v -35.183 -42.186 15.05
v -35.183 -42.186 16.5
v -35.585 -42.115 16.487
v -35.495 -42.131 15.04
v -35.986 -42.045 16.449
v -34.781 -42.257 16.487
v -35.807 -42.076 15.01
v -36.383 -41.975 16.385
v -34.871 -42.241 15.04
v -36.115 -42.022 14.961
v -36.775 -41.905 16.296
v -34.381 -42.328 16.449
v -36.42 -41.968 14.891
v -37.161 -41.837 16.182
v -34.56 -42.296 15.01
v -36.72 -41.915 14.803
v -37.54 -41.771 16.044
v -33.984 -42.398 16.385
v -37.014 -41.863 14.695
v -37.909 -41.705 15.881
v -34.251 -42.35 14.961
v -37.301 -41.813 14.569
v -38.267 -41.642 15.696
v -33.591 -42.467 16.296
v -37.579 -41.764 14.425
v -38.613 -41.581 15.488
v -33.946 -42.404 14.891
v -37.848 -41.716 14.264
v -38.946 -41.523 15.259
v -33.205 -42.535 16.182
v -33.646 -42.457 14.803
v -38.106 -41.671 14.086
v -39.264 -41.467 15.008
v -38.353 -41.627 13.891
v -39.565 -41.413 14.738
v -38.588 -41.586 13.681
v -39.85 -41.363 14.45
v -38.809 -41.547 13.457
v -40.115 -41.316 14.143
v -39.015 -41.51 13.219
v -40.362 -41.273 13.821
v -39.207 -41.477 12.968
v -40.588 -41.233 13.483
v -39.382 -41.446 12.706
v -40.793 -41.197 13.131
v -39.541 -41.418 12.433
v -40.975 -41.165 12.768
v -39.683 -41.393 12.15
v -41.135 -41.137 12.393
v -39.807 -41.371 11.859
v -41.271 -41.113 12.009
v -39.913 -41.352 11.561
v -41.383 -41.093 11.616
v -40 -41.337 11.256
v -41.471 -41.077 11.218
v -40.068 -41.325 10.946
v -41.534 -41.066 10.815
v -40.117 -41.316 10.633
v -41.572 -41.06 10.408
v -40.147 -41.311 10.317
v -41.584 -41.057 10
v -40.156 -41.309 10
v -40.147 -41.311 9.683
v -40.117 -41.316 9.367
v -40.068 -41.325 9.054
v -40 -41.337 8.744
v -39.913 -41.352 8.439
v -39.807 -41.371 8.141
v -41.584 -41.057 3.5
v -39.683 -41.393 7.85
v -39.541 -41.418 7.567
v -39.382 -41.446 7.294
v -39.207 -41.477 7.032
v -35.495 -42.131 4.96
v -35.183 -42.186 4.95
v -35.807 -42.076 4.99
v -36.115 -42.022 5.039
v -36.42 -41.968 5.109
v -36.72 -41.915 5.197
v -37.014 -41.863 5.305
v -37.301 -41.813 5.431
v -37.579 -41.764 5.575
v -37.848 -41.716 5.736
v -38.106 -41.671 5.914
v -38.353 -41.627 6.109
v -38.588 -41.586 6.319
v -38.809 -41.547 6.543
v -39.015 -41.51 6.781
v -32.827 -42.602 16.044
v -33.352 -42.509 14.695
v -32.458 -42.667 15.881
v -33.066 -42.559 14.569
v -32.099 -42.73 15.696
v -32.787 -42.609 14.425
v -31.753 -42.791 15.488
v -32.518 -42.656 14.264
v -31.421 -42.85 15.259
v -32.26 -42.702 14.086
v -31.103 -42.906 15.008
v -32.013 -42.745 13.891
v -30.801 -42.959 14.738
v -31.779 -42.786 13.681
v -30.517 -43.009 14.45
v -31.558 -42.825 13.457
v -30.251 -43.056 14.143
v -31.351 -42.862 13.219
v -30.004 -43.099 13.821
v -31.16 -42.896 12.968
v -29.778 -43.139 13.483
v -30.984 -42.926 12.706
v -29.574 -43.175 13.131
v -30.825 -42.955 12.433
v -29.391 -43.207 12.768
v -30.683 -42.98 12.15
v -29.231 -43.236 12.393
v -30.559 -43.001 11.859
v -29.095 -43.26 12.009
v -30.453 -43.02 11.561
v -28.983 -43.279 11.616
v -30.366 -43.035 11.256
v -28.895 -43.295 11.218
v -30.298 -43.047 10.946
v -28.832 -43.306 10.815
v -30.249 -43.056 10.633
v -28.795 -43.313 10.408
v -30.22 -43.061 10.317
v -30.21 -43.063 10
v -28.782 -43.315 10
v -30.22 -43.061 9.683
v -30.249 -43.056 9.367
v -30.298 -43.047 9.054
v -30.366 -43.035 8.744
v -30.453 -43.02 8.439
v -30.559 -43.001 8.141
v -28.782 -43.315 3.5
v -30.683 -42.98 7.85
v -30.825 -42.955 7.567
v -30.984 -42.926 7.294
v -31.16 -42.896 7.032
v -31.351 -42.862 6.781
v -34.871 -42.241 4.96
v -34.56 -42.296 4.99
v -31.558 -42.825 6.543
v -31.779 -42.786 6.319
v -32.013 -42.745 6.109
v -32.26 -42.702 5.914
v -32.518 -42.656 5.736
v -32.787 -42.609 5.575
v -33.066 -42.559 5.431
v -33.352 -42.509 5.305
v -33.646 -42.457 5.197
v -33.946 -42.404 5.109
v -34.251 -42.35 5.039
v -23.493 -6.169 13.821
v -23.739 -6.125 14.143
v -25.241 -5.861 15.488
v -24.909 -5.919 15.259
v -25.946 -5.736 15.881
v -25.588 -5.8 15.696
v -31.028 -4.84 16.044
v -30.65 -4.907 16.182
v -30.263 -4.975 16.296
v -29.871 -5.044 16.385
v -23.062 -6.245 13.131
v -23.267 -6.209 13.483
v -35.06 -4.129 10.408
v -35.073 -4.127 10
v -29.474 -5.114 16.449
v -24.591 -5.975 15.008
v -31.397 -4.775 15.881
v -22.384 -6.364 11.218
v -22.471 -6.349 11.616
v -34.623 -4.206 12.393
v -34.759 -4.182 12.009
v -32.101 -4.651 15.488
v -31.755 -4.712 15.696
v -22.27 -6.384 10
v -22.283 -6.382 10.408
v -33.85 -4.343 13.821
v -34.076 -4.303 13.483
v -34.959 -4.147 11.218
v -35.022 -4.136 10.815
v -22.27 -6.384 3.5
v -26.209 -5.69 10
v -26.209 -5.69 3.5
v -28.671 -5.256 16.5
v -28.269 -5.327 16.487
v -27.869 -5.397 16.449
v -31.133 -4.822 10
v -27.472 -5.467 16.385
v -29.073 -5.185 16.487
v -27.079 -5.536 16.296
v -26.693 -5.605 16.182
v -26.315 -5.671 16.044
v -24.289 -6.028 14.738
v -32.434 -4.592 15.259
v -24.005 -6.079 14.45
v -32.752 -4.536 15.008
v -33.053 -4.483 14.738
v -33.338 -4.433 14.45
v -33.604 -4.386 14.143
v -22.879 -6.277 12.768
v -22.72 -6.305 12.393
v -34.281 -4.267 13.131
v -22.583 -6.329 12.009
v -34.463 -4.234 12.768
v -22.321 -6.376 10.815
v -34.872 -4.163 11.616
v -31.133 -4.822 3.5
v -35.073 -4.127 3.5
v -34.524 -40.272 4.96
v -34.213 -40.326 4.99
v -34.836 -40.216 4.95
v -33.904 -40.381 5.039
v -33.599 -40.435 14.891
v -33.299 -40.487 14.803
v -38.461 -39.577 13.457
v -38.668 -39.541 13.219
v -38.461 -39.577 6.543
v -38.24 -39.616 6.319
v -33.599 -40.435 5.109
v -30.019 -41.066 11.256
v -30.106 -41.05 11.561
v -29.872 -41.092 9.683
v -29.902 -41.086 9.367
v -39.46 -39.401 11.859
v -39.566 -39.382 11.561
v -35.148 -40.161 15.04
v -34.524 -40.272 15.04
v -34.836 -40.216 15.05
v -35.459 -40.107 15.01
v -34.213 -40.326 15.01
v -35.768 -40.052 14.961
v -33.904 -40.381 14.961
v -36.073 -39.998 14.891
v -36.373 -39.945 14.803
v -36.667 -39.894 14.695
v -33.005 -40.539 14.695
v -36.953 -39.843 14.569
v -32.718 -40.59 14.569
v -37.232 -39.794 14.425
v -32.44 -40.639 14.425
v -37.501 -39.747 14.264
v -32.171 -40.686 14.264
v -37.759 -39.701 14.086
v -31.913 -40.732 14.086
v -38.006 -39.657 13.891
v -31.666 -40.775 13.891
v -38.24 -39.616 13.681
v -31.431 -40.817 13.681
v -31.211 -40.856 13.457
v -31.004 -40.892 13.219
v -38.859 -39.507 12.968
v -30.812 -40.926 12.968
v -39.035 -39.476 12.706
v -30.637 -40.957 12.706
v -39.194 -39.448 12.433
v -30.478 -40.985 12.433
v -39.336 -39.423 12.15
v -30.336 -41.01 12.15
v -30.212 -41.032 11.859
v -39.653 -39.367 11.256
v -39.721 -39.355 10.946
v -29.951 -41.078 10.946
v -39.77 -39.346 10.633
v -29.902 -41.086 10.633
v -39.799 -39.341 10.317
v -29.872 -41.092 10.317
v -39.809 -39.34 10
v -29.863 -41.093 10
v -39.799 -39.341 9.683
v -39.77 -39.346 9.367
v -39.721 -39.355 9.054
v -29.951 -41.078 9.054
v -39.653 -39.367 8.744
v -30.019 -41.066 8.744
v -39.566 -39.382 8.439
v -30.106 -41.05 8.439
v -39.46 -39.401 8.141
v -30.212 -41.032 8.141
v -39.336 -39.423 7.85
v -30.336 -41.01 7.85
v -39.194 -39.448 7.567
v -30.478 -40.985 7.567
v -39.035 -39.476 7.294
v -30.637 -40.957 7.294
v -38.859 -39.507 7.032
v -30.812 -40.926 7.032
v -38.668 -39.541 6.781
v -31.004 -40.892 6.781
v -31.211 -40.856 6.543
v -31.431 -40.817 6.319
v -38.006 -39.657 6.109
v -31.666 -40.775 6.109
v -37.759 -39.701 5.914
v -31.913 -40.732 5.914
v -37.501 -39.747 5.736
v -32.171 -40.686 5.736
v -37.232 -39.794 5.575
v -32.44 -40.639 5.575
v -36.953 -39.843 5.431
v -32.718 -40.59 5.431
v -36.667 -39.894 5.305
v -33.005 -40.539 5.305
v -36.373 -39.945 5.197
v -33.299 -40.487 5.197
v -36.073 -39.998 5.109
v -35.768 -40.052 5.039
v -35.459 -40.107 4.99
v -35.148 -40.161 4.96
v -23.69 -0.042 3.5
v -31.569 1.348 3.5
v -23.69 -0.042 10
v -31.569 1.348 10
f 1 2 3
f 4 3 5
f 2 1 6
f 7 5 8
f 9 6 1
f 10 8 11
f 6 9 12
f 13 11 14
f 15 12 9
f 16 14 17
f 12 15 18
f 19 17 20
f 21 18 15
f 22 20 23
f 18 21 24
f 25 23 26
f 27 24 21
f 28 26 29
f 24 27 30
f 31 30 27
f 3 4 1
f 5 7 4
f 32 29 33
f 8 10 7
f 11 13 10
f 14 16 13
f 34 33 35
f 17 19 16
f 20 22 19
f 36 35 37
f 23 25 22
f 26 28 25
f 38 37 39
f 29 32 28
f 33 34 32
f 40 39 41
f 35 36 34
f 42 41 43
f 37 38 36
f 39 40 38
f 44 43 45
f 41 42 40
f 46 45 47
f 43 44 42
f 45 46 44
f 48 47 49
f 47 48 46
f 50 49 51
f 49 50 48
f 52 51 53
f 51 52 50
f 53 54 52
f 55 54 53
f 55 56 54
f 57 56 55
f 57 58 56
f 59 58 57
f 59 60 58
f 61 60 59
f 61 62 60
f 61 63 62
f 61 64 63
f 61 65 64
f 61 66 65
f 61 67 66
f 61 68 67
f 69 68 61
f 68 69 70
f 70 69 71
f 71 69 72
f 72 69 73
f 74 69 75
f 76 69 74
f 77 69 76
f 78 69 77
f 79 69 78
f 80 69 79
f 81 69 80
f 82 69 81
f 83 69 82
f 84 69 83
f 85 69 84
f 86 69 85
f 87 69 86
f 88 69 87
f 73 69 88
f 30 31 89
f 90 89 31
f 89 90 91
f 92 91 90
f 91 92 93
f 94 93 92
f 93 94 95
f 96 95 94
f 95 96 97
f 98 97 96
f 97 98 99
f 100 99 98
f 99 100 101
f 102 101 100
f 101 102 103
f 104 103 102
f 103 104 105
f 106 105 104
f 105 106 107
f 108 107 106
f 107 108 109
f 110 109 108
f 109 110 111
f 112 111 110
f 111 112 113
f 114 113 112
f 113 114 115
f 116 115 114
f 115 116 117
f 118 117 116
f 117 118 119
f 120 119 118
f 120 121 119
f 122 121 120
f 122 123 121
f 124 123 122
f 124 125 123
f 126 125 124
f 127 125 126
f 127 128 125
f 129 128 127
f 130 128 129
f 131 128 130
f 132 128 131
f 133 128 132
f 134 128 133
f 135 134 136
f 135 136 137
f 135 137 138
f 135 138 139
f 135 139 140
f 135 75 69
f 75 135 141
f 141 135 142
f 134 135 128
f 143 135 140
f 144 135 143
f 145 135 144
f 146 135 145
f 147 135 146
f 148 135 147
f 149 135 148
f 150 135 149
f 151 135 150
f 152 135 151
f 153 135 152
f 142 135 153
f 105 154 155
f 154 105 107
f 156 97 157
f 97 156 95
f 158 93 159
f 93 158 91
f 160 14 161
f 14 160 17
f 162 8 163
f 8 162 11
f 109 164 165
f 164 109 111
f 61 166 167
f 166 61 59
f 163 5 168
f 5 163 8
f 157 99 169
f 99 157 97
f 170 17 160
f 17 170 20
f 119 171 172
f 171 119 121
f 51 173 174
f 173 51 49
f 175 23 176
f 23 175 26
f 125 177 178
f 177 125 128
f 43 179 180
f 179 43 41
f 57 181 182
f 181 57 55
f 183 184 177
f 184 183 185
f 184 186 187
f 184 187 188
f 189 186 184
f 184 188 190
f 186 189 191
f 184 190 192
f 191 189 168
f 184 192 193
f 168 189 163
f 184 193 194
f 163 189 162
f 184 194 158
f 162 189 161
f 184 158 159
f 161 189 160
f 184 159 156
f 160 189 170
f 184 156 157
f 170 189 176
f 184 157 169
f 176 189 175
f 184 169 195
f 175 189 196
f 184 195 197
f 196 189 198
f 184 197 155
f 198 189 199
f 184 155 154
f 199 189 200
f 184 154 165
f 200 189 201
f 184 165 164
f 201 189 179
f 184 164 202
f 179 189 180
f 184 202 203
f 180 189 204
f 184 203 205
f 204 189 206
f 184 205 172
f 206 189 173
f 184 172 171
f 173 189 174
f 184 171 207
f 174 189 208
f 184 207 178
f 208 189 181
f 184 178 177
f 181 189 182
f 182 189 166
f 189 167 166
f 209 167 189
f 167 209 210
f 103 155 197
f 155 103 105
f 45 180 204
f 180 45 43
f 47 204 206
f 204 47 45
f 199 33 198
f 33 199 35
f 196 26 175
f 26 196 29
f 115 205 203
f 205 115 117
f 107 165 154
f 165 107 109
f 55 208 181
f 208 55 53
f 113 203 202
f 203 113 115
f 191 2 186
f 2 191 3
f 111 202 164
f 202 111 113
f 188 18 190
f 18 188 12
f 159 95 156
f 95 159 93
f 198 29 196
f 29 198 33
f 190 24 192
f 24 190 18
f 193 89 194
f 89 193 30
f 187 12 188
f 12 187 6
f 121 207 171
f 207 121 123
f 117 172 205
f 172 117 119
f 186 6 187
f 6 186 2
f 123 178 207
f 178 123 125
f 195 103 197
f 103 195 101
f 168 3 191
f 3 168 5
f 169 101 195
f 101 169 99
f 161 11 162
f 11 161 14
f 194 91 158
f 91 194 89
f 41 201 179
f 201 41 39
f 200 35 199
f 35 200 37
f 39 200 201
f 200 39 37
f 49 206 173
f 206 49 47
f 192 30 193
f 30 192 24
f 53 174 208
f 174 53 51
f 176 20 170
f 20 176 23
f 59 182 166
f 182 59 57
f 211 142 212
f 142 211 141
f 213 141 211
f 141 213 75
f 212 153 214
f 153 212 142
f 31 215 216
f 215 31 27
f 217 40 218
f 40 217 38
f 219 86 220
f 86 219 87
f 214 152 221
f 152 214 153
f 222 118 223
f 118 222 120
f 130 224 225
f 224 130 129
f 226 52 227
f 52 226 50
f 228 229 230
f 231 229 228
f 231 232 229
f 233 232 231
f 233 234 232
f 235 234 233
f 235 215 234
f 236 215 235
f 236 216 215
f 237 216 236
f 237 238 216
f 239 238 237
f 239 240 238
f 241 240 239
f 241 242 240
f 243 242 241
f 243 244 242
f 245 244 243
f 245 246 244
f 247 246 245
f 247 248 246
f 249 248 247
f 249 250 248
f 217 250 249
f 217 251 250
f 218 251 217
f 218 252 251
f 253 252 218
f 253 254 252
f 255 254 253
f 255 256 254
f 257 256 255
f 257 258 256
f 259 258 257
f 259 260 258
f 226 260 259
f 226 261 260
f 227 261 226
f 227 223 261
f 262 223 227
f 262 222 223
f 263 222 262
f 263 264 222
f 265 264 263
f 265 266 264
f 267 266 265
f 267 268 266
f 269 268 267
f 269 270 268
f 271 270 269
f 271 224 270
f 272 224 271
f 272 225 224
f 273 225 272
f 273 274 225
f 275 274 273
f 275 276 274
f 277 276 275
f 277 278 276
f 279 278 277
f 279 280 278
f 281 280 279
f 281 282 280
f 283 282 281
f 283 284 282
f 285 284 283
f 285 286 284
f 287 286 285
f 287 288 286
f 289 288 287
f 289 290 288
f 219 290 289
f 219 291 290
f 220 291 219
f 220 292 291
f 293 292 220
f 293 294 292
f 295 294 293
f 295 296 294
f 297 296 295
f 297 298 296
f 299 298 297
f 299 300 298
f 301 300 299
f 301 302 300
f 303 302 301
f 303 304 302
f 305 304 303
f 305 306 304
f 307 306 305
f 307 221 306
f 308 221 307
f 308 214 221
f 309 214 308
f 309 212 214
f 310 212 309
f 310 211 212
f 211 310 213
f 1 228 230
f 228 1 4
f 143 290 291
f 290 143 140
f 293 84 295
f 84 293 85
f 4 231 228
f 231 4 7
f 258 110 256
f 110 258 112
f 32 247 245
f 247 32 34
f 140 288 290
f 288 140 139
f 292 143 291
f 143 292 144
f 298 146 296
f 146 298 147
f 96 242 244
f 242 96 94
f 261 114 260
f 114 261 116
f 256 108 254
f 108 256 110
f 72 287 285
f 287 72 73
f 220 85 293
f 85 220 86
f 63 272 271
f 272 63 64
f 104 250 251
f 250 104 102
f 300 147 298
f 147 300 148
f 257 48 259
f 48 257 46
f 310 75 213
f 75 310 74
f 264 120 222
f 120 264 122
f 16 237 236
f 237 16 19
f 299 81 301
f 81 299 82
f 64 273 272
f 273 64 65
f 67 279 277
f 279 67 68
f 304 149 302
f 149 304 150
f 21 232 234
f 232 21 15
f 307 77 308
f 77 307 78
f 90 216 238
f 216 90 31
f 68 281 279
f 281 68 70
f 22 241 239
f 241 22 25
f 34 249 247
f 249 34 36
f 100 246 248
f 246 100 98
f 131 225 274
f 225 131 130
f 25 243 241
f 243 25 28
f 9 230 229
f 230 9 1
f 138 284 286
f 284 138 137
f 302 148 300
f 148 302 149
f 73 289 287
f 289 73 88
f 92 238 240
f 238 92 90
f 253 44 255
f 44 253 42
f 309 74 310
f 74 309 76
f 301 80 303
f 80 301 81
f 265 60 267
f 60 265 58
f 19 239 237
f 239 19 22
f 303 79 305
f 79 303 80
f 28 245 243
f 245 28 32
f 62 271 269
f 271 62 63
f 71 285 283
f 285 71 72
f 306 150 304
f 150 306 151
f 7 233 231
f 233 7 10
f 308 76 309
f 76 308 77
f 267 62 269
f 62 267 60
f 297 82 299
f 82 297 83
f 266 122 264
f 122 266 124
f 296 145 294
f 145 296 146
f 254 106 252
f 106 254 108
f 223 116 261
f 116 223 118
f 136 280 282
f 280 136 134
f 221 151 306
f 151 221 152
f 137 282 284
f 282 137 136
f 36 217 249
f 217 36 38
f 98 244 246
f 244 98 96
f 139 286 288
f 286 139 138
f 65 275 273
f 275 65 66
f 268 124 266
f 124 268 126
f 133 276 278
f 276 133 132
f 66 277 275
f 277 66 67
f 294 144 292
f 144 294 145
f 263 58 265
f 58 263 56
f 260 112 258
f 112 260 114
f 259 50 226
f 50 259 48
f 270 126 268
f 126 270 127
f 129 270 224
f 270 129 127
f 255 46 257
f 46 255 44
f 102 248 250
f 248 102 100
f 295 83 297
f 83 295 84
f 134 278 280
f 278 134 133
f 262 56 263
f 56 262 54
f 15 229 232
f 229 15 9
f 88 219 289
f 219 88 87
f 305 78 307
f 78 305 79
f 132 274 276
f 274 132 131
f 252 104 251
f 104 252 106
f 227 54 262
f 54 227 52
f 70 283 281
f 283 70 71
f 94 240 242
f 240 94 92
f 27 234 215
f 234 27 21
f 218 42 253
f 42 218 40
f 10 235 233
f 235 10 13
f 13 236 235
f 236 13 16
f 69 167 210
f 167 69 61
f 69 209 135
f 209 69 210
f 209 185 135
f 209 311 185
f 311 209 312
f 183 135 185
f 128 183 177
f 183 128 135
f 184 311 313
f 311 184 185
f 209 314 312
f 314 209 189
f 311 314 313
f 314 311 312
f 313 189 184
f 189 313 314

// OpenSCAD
height = 3;
angle = -5;
magnetDiameter = 10.1;
magnetDepth = 4;
connectionLen1 = 42 - 4.5;
connectionLen2 = 34;
 
// Крепление
width1 = 8;
width2 = 5;
height = 6;
outerDiameter = 13;


verticalOffset = 4 + height;



module pad() {
    rotate([0, angle, 0]) translate([0, 0, height]) import ("wrist_rest_body.stl");
}

module hole() {
    import ("wrist_rest_hole.stl");
}

module mount() {
    extraSize = 0;
    translate([0, height/2, 0])
    linear_extrude(height = outerDiameter / 2, center=true) 
        polygon([[width1/2 - extraSize, height/2], [width2/2 - extraSize, -height/2], [-width2/2 + extraSize, -height/2], [-width1/2 + extraSize, height/2]]);
}

module mountHole() {
    extraSize = 0.1;
    translate([0, height/2, 0])
    linear_extrude(height = outerDiameter, center=true) 
        polygon([[width1/2 + extraSize, height/2], [width2/2 + extraSize, -height/2], 
    [-width2/2 - extraSize, -height/2], [-width1/2 - extraSize, height/2]]);
}

module connection1() {
    offsetY = 100;
    offsetX = -30;
    zAngle = 10;
    
    rotate([0,0,180 - zAngle]) difference () {
      union () {
          //connection1
          translate ([offsetX + 57.323170855986945, offsetY - 52.3453382149892, verticalOffset]) {
            difference () {
              rotate ([0.0,90.0,90.0]) {
                translate ([0, 0, - connectionLen1/2]) {
                  cylinder ($fn=100, h=connectionLen1, r= outerDiameter / 2, center=true);
                }
              }
              rotate ([0.0,90.0,90.0]) {
                 cylinder ($fn=100, magnetDepth, r = magnetDiameter /2, center=true);
                  //cylinder ($fn=100, h=12, r=3/2, center=true);
              }
            }
            // mount
            translate([0,-connectionLen1, -outerDiameter / 4]) rotate([0,0, 180]) mount();
            
            // bottom plate
            difference() {
                translate ([-outerDiameter / 2, -connectionLen1, - outerDiameter/2]) cube([outerDiameter, connectionLen1, outerDiameter /2 ]);
                
                  rotate ([0.0,90.0,90.0]) { 
                      translate ([0, 0, - connectionLen1/2]) {
                        cylinder ($fn=100, h=connectionLen1, r= outerDiameter / 2, center=true);
                      }
                }
            }
          }
      }
    }
}

module connection2() {
    offsetY = 100;
    offsetX = -30;
    zAngle = 10;
    
    rotate([0,0,180 - zAngle]) difference () {
      union () {
      //connection 2
      translate ([offsetX + 24.276834822499474, offsetY - 59.30185901031496, verticalOffset]) {
        difference () {
          rotate ([0.0,90.0,90.0]) {
            translate ([0, 0, -connectionLen2/2]) {
              cylinder ($fn=100, h=connectionLen2, r=outerDiameter / 2, center=true);
            }
          }
          rotate ([0.0,90.0,90.0]) {
            union () {
              cylinder ($fn=100, h=magnetDepth, r=magnetDiameter / 2, center=true);
              //cylinder ($fn=100, h=12, r=3/2, center=true);
            }
          }
        }
        // mount
        translate([0,-connectionLen2, -outerDiameter / 4]) rotate([0,0, 180]) mount();
      
        // bottom plate
        difference() {
                translate ([-outerDiameter / 2, -connectionLen2, - outerDiameter/2]) cube([outerDiameter, connectionLen2, outerDiameter /2 ]);
                
                  rotate ([0.0,90.0,90.0]) { 
                      translate ([0, 0, - connectionLen2/2]) {
                        cylinder ($fn=100, h=connectionLen2, r= outerDiameter / 2, center=true);
                      }
                }
        }
    }
      }
    }   
}

module connections() {
    connection1();
    connection2();
}

module connectionsHoles() {
    offsetY = 100;
    offsetX = -30;
    zAngle = 10;
    
    connectionLen1 = 18;
    connectionLen2 = 10;
    
    rotate([0,0,180 - zAngle]) difference () {
      union () {
        union () {
            //connection1
          translate ([offsetX + 57.3, offsetY - 52.3, verticalOffset]) {
              rotate ([0.0,90.0,90.0]) {
                translate ([0, 0, - connectionLen1/2]) {
                    cylinder ($fn=100, h=connectionLen1, r=outerDiameter/2, center=true);
                    translate([outerDiameter/2, 0, 0]) cube([outerDiameter, outerDiameter, connectionLen1], center=true);
                }
              }
             
             // mount
             translate([0,-connectionLen1,  -outerDiameter / 2]) rotate([0,0, 180]) mountHole();
          }
          //connection 2
          translate ([offsetX + 24.3, offsetY - 59.3, verticalOffset]) {
              rotate ([0.0,90.0,90.0]) {
                translate ([0, 0, -connectionLen2/2]) {
                    translate([outerDiameter/2, 0, 0]) cube([outerDiameter, outerDiameter, connectionLen2], center=true);
                    cylinder ($fn=100, h=connectionLen2, r=outerDiameter/2, center=true);
                }
              }
            
             // mount
             translate([0,-connectionLen2, -outerDiameter / 2]) rotate([0,0, 180]) mountHole();
          }
        }
      }
    
      
    }
}

module wristRestRight() {
    difference() {
        linear_extrude(height = 40)  projection () pad();
        
        translate([0,0,height + 38]) rotate([0, angle, 0]) cube ([200,200, 50], true);
        
        translate([0,0,height + 8]) rotate([0, angle, 0]) import("wrist_rest_hole.stl");

        connectionsHoles();
    };
}

//wristRestRight();
connection1();
//connection2();

//translate([0,0,height/2]) cube([200, 200, height], true);
